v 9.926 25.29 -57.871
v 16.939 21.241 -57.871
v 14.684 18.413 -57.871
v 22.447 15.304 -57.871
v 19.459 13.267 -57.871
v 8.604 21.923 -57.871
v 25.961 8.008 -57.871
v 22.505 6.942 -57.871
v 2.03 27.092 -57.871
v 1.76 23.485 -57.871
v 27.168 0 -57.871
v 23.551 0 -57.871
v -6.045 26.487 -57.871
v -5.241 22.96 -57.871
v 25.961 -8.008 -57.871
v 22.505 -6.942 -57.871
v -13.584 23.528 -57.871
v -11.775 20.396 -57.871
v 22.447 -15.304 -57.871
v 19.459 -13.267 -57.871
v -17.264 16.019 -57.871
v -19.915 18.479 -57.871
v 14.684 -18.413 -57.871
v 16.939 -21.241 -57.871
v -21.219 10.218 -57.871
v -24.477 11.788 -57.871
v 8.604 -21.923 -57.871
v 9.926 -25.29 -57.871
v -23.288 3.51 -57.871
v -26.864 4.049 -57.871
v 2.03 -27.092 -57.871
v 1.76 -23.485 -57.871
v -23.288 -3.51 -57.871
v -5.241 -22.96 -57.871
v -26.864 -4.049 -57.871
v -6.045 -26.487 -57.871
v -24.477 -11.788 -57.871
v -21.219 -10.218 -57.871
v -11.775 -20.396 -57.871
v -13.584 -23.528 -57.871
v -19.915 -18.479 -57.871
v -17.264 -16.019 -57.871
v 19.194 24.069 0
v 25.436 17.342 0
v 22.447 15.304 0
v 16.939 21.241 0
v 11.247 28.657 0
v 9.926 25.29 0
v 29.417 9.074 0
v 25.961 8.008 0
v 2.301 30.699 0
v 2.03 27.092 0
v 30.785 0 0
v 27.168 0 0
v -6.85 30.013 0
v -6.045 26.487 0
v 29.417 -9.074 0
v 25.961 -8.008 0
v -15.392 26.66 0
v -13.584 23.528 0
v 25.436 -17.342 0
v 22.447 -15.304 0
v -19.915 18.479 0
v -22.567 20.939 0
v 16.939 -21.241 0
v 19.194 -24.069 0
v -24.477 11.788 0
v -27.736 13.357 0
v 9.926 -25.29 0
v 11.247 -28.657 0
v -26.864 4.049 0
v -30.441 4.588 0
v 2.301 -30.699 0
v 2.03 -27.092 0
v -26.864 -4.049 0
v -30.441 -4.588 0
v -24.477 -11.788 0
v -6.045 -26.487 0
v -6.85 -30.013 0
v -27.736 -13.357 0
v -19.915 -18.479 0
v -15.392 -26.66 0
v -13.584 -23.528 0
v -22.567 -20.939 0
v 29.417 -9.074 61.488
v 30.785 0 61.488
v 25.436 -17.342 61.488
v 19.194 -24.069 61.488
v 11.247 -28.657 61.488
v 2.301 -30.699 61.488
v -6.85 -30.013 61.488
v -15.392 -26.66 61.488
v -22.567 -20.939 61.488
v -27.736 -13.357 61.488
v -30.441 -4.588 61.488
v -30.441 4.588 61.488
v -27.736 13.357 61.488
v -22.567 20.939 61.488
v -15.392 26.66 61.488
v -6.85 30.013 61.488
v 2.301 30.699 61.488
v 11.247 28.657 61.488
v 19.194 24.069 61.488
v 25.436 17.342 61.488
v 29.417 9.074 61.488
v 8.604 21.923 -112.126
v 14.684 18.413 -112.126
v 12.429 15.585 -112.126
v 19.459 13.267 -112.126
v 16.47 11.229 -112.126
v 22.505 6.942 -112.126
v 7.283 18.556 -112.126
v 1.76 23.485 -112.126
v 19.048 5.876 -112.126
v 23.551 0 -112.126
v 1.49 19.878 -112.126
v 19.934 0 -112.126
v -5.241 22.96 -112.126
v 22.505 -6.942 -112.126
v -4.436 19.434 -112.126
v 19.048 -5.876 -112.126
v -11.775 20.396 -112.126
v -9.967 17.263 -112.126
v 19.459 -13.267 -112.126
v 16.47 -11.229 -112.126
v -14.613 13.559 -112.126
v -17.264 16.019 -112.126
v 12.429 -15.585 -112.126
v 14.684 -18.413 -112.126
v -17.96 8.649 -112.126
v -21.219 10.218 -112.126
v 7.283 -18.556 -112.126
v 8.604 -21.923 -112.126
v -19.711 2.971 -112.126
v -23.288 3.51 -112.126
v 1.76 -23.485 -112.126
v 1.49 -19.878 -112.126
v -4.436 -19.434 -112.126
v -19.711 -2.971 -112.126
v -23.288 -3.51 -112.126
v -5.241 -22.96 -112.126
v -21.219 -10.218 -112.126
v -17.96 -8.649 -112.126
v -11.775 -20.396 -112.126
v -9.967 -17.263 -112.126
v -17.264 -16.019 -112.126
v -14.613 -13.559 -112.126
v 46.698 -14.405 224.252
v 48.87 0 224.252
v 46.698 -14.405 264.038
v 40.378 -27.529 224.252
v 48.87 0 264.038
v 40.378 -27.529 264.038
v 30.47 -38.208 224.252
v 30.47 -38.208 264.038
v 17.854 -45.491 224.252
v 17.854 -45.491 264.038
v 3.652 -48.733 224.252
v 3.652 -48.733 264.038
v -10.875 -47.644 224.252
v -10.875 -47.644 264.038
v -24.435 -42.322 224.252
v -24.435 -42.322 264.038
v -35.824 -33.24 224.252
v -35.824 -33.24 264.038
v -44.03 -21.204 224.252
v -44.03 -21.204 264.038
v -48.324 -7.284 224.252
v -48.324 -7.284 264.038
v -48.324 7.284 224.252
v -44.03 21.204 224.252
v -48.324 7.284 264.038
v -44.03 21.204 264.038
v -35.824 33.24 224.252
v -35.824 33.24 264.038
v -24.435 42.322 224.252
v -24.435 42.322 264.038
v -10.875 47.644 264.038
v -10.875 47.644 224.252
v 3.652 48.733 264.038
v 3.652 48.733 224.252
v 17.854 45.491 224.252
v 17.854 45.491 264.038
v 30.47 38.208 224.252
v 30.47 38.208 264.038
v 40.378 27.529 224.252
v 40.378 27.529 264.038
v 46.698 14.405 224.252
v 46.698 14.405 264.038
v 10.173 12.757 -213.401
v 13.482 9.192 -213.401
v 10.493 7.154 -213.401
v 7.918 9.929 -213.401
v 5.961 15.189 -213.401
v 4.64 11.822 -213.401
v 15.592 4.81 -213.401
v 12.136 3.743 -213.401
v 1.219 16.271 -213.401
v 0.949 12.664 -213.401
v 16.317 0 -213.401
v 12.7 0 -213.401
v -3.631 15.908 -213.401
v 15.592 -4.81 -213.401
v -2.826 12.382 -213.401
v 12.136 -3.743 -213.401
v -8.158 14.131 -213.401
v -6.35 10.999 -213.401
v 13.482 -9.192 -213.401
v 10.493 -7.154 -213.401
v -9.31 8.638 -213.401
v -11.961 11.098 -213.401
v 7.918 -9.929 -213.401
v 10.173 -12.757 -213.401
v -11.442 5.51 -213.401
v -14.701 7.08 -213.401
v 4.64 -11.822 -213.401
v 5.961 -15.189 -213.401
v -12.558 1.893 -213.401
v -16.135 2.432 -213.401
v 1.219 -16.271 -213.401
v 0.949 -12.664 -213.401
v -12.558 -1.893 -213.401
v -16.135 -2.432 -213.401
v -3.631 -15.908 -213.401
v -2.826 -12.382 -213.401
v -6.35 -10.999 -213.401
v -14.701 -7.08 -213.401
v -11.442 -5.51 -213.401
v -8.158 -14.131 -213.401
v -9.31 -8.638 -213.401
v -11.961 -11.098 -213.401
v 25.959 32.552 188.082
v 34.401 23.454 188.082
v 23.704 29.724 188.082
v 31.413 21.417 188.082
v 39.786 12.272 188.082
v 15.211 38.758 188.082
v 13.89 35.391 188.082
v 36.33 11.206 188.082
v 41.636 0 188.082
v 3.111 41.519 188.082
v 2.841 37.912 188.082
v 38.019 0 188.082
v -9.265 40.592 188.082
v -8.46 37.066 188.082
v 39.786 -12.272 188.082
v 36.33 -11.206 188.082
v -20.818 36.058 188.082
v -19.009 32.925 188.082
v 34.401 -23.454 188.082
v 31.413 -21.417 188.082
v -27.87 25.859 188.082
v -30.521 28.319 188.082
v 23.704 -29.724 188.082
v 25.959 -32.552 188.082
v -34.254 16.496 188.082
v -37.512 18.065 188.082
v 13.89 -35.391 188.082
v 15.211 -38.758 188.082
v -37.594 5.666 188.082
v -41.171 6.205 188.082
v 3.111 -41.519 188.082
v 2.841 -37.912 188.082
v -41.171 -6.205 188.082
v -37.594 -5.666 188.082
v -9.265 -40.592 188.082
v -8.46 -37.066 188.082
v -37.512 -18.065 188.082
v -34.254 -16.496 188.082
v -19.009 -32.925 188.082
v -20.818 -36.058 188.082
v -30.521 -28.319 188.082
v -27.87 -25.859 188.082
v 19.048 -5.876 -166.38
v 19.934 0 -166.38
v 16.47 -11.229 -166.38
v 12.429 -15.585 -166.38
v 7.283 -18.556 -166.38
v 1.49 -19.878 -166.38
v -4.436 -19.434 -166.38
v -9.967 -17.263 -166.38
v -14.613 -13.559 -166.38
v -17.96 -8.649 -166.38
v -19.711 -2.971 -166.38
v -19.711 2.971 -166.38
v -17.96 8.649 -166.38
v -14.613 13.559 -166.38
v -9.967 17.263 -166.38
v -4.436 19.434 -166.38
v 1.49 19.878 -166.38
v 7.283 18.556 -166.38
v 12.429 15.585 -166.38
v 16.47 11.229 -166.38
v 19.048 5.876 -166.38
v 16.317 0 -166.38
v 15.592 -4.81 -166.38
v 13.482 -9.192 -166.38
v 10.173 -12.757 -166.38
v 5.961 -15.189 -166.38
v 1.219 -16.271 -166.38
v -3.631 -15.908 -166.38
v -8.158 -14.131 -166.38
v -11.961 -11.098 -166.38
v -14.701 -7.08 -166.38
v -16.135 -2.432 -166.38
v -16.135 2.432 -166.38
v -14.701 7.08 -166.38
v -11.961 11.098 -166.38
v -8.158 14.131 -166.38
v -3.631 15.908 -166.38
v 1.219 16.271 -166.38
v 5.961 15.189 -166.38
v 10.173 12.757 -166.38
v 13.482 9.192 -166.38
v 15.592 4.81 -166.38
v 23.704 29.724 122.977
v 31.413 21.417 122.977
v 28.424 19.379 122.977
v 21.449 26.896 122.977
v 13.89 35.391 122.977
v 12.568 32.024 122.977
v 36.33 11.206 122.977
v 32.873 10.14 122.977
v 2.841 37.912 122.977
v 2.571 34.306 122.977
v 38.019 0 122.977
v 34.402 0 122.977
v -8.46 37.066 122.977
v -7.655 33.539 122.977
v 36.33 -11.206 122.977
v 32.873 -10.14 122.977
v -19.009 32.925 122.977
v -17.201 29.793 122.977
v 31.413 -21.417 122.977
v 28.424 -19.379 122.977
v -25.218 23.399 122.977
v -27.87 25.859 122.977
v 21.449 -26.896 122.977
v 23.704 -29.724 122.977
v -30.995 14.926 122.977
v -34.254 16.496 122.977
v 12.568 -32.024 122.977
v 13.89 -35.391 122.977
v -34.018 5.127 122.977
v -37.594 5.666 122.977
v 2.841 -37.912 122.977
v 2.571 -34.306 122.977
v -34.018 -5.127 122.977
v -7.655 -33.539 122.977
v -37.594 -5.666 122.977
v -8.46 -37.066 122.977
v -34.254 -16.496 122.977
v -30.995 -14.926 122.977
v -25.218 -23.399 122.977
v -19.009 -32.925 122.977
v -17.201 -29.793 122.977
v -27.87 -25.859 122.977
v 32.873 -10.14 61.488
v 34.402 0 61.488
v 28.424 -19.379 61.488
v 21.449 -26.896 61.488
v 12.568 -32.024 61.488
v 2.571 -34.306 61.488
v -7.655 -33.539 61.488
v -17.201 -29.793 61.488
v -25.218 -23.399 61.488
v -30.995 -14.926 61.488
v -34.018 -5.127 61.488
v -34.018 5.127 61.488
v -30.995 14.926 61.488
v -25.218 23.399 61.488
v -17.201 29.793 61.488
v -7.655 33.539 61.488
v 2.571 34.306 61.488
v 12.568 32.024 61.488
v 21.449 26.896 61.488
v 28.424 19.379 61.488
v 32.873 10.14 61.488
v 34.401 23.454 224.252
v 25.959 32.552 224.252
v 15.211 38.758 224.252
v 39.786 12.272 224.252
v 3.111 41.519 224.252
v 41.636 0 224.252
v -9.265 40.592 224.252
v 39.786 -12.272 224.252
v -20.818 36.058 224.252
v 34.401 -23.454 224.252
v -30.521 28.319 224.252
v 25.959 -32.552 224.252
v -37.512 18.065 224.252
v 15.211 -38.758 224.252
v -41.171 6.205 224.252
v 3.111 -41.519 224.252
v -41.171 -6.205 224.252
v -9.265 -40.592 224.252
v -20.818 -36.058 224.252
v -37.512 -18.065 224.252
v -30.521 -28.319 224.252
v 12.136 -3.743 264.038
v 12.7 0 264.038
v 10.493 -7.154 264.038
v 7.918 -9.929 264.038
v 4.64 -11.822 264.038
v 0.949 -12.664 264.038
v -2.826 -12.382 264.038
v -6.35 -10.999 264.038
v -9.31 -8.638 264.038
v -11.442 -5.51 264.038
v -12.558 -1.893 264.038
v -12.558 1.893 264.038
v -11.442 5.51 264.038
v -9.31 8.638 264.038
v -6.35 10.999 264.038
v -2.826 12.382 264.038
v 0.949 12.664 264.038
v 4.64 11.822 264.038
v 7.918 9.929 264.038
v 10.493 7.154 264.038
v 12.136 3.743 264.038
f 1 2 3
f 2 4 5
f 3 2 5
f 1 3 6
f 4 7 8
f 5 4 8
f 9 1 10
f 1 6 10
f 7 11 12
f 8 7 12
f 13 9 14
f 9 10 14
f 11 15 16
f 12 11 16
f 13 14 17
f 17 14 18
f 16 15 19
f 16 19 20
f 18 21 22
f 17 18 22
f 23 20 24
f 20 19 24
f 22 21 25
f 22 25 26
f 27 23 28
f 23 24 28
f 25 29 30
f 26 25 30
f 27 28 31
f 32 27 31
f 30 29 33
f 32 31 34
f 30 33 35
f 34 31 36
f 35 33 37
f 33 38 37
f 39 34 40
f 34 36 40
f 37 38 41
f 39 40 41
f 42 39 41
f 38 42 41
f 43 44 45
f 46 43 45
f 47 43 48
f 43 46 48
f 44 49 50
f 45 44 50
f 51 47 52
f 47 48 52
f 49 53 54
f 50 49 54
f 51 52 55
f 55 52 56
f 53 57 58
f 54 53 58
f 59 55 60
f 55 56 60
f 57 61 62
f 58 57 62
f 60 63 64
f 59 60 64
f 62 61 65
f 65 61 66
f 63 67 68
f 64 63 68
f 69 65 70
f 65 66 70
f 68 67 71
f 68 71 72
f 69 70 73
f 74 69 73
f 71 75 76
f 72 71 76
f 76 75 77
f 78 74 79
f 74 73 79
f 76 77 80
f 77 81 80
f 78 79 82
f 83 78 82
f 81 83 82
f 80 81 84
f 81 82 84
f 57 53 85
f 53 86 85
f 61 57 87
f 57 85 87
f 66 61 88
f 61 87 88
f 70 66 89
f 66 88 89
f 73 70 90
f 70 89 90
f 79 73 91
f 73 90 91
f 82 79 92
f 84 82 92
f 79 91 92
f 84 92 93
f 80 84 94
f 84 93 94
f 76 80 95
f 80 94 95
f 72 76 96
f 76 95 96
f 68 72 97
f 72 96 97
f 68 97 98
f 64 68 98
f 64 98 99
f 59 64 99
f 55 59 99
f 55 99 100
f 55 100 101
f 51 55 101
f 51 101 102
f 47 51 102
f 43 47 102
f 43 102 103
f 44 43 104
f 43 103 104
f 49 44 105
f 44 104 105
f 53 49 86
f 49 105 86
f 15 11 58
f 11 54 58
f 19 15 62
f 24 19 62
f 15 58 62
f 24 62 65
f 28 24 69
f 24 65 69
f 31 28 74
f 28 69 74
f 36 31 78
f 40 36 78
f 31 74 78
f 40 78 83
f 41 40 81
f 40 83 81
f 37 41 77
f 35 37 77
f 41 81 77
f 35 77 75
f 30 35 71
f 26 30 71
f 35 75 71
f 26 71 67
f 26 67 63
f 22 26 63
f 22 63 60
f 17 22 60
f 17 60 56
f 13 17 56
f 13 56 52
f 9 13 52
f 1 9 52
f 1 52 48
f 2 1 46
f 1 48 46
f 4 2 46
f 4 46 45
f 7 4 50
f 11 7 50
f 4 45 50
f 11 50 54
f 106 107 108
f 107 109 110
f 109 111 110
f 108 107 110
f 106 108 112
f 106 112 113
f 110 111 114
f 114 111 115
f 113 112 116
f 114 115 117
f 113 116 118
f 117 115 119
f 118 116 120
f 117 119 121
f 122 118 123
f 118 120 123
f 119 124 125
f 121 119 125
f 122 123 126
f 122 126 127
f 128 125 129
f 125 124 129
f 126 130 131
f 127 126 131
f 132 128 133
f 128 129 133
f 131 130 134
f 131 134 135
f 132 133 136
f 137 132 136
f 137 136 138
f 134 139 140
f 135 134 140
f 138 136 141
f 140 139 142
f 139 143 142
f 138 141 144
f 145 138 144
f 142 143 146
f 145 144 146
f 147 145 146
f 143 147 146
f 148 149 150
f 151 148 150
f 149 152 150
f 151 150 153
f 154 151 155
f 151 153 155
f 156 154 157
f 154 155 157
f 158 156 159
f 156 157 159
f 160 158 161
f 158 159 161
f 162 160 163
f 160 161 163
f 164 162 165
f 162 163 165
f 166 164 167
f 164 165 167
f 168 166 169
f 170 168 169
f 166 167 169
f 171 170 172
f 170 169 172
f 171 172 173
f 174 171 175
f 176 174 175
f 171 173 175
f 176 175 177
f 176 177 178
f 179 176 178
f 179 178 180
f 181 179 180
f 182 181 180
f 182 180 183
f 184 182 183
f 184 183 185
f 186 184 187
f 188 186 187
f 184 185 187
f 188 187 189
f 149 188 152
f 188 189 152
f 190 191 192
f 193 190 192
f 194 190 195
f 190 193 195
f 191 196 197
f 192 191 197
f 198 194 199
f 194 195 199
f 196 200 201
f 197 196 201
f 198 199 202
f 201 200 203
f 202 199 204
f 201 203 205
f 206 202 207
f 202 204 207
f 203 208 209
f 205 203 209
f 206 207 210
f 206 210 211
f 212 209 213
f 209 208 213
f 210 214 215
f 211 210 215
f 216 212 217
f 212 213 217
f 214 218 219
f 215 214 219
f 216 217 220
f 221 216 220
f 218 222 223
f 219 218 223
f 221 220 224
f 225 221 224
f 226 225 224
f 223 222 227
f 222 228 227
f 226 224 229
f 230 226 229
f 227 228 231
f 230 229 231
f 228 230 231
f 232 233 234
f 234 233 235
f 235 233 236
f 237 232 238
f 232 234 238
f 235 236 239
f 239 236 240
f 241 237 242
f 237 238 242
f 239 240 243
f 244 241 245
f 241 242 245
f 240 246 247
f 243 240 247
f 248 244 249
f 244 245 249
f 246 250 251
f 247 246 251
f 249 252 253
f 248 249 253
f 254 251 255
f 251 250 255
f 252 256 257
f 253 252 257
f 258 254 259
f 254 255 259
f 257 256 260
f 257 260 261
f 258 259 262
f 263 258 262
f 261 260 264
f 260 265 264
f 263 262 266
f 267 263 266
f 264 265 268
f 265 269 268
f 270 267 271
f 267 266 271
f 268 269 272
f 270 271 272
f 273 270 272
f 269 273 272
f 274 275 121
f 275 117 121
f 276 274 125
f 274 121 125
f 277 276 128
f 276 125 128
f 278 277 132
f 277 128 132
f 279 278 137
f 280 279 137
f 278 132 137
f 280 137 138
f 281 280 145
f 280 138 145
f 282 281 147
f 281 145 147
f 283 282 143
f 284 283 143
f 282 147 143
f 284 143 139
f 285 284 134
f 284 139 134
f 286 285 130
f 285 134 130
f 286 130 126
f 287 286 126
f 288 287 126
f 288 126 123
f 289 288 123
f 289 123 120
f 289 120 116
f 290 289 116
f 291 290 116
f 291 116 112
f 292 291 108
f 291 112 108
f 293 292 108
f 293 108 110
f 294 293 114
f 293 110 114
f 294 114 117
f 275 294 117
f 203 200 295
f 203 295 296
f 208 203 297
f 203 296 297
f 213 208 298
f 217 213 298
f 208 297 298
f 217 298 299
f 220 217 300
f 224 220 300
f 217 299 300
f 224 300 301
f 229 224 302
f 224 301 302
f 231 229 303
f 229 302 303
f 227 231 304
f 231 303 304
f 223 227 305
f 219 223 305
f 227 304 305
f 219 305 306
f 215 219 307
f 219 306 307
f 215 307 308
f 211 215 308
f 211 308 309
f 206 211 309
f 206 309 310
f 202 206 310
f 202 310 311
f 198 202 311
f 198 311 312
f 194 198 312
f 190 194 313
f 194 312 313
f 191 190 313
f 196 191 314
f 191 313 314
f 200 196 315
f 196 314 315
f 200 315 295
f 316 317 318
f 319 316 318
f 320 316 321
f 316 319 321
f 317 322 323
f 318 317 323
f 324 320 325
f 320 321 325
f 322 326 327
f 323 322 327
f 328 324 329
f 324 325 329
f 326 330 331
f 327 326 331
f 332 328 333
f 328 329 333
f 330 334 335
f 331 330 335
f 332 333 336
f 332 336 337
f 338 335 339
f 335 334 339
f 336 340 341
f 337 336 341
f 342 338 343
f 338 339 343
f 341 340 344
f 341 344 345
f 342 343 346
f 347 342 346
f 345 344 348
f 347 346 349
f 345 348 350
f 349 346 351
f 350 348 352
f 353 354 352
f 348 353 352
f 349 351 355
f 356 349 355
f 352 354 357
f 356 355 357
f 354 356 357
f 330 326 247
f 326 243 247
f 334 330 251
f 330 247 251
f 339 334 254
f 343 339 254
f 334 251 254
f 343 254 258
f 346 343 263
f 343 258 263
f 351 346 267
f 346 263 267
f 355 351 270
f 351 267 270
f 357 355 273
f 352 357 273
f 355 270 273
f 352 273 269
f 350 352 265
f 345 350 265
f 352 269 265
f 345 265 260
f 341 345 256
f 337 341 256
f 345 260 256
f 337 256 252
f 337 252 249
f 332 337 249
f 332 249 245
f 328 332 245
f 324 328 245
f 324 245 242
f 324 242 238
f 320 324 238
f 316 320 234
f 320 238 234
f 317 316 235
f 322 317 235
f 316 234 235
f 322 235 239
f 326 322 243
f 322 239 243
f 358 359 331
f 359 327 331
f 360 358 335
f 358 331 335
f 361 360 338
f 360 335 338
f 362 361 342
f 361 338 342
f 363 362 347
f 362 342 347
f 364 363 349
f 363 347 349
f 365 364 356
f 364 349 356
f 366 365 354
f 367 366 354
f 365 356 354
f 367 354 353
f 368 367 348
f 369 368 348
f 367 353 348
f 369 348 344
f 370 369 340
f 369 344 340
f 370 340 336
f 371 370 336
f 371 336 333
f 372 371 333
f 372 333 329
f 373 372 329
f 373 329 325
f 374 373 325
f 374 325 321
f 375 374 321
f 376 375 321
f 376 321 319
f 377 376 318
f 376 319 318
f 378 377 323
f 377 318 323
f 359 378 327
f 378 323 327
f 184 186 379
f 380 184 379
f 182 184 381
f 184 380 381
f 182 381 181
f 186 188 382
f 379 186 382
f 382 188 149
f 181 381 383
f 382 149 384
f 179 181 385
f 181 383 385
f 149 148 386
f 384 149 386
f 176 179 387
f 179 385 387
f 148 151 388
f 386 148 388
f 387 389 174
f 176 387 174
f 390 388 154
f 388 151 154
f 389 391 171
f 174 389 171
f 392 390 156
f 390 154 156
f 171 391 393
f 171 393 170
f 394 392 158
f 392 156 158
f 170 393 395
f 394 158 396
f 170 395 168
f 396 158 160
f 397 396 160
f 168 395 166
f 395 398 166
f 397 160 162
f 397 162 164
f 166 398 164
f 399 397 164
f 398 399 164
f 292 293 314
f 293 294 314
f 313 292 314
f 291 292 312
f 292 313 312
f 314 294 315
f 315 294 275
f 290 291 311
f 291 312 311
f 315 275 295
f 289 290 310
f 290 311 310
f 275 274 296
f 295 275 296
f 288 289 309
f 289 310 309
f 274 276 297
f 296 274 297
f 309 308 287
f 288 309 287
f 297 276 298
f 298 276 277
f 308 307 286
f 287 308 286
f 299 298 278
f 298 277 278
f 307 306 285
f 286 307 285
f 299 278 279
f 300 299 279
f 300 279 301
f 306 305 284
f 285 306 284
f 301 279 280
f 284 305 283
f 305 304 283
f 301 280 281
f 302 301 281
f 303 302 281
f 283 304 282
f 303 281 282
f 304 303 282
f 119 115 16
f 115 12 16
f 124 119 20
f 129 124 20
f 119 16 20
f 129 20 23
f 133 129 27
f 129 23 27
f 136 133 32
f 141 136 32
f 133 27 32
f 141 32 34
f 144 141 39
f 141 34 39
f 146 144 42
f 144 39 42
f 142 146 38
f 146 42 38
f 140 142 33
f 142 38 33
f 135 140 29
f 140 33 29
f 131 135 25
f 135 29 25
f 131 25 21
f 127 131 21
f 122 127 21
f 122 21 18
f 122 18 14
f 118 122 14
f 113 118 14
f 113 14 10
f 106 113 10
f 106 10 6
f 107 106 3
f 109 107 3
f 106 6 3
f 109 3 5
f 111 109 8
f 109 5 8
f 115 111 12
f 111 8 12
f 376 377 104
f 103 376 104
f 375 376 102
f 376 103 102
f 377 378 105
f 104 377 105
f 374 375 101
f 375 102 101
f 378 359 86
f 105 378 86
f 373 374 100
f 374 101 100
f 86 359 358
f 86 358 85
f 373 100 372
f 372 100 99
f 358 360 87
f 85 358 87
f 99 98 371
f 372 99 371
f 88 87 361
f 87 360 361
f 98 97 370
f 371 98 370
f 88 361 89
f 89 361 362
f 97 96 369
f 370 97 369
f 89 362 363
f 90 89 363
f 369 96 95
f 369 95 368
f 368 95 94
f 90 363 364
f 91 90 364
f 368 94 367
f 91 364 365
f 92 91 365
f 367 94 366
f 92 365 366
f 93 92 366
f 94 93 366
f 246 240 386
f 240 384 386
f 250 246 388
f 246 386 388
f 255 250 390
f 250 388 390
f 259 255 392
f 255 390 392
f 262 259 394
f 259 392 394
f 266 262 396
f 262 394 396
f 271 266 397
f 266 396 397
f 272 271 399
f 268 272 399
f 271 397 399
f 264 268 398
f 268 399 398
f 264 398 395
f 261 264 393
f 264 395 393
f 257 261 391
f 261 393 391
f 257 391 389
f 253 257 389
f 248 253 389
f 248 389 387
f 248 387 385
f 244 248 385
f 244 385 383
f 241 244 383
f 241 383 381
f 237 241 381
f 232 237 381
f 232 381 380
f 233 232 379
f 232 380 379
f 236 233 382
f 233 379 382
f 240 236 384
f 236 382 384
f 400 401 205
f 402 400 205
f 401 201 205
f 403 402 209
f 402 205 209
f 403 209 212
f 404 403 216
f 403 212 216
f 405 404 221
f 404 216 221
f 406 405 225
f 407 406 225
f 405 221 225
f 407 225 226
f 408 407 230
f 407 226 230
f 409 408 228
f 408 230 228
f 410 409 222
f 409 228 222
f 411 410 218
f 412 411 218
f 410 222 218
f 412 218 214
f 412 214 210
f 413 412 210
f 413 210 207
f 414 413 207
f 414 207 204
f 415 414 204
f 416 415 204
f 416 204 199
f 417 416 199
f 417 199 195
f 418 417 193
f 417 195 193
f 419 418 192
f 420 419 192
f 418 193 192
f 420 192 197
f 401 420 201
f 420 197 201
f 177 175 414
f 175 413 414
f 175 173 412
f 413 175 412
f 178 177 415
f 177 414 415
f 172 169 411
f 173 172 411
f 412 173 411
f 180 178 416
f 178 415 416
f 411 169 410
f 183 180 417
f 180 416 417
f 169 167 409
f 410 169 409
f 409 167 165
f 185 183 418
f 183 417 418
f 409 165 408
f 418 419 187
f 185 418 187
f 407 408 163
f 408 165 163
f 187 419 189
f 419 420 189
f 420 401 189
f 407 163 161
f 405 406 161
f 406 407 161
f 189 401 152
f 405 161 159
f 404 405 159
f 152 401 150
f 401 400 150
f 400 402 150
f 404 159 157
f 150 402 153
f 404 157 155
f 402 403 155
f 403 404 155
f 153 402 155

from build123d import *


with BuildPart() as part:
    # Sketch1 → Revolve1 (revolve)
    with BuildSketch(Plane(origin=(0, 0, 0), x_dir=(0, 0, -1), z_dir=(1, 0, 0)), mode=Mode.PRIVATE) as revolve1_sk:
        Polygon((-264.03808, 12.7), (213.40064, 12.7), (213.40064, 16.31696), (166.38016, 16.31696), (166.38016, 19.93392), (112.12576, 19.93392), (112.12576, 23.55088), (57.87136, 23.55088), (57.87136, 27.16784), (0, 27.16784), (0, 30.7848), (-61.48832, 30.7848), (-61.48832, 34.40176), (-122.97664, 34.40176), (-122.97664, 38.01872), (-188.08192, 38.01872), (-188.08192, 41.63568), (-224.25152, 41.63568), (-224.25152, 48.8696), (-264.03808, 48.8696), (-264.03808, 38.01872), align=None)
    revolve(revolve1_sk.sketch.rotate(Axis((0, 0, 19.904928919), (0, 0, -1)), 90), axis=Axis((0, 0, 19.904928919), (0, 0, -1)))


solid = part.part
